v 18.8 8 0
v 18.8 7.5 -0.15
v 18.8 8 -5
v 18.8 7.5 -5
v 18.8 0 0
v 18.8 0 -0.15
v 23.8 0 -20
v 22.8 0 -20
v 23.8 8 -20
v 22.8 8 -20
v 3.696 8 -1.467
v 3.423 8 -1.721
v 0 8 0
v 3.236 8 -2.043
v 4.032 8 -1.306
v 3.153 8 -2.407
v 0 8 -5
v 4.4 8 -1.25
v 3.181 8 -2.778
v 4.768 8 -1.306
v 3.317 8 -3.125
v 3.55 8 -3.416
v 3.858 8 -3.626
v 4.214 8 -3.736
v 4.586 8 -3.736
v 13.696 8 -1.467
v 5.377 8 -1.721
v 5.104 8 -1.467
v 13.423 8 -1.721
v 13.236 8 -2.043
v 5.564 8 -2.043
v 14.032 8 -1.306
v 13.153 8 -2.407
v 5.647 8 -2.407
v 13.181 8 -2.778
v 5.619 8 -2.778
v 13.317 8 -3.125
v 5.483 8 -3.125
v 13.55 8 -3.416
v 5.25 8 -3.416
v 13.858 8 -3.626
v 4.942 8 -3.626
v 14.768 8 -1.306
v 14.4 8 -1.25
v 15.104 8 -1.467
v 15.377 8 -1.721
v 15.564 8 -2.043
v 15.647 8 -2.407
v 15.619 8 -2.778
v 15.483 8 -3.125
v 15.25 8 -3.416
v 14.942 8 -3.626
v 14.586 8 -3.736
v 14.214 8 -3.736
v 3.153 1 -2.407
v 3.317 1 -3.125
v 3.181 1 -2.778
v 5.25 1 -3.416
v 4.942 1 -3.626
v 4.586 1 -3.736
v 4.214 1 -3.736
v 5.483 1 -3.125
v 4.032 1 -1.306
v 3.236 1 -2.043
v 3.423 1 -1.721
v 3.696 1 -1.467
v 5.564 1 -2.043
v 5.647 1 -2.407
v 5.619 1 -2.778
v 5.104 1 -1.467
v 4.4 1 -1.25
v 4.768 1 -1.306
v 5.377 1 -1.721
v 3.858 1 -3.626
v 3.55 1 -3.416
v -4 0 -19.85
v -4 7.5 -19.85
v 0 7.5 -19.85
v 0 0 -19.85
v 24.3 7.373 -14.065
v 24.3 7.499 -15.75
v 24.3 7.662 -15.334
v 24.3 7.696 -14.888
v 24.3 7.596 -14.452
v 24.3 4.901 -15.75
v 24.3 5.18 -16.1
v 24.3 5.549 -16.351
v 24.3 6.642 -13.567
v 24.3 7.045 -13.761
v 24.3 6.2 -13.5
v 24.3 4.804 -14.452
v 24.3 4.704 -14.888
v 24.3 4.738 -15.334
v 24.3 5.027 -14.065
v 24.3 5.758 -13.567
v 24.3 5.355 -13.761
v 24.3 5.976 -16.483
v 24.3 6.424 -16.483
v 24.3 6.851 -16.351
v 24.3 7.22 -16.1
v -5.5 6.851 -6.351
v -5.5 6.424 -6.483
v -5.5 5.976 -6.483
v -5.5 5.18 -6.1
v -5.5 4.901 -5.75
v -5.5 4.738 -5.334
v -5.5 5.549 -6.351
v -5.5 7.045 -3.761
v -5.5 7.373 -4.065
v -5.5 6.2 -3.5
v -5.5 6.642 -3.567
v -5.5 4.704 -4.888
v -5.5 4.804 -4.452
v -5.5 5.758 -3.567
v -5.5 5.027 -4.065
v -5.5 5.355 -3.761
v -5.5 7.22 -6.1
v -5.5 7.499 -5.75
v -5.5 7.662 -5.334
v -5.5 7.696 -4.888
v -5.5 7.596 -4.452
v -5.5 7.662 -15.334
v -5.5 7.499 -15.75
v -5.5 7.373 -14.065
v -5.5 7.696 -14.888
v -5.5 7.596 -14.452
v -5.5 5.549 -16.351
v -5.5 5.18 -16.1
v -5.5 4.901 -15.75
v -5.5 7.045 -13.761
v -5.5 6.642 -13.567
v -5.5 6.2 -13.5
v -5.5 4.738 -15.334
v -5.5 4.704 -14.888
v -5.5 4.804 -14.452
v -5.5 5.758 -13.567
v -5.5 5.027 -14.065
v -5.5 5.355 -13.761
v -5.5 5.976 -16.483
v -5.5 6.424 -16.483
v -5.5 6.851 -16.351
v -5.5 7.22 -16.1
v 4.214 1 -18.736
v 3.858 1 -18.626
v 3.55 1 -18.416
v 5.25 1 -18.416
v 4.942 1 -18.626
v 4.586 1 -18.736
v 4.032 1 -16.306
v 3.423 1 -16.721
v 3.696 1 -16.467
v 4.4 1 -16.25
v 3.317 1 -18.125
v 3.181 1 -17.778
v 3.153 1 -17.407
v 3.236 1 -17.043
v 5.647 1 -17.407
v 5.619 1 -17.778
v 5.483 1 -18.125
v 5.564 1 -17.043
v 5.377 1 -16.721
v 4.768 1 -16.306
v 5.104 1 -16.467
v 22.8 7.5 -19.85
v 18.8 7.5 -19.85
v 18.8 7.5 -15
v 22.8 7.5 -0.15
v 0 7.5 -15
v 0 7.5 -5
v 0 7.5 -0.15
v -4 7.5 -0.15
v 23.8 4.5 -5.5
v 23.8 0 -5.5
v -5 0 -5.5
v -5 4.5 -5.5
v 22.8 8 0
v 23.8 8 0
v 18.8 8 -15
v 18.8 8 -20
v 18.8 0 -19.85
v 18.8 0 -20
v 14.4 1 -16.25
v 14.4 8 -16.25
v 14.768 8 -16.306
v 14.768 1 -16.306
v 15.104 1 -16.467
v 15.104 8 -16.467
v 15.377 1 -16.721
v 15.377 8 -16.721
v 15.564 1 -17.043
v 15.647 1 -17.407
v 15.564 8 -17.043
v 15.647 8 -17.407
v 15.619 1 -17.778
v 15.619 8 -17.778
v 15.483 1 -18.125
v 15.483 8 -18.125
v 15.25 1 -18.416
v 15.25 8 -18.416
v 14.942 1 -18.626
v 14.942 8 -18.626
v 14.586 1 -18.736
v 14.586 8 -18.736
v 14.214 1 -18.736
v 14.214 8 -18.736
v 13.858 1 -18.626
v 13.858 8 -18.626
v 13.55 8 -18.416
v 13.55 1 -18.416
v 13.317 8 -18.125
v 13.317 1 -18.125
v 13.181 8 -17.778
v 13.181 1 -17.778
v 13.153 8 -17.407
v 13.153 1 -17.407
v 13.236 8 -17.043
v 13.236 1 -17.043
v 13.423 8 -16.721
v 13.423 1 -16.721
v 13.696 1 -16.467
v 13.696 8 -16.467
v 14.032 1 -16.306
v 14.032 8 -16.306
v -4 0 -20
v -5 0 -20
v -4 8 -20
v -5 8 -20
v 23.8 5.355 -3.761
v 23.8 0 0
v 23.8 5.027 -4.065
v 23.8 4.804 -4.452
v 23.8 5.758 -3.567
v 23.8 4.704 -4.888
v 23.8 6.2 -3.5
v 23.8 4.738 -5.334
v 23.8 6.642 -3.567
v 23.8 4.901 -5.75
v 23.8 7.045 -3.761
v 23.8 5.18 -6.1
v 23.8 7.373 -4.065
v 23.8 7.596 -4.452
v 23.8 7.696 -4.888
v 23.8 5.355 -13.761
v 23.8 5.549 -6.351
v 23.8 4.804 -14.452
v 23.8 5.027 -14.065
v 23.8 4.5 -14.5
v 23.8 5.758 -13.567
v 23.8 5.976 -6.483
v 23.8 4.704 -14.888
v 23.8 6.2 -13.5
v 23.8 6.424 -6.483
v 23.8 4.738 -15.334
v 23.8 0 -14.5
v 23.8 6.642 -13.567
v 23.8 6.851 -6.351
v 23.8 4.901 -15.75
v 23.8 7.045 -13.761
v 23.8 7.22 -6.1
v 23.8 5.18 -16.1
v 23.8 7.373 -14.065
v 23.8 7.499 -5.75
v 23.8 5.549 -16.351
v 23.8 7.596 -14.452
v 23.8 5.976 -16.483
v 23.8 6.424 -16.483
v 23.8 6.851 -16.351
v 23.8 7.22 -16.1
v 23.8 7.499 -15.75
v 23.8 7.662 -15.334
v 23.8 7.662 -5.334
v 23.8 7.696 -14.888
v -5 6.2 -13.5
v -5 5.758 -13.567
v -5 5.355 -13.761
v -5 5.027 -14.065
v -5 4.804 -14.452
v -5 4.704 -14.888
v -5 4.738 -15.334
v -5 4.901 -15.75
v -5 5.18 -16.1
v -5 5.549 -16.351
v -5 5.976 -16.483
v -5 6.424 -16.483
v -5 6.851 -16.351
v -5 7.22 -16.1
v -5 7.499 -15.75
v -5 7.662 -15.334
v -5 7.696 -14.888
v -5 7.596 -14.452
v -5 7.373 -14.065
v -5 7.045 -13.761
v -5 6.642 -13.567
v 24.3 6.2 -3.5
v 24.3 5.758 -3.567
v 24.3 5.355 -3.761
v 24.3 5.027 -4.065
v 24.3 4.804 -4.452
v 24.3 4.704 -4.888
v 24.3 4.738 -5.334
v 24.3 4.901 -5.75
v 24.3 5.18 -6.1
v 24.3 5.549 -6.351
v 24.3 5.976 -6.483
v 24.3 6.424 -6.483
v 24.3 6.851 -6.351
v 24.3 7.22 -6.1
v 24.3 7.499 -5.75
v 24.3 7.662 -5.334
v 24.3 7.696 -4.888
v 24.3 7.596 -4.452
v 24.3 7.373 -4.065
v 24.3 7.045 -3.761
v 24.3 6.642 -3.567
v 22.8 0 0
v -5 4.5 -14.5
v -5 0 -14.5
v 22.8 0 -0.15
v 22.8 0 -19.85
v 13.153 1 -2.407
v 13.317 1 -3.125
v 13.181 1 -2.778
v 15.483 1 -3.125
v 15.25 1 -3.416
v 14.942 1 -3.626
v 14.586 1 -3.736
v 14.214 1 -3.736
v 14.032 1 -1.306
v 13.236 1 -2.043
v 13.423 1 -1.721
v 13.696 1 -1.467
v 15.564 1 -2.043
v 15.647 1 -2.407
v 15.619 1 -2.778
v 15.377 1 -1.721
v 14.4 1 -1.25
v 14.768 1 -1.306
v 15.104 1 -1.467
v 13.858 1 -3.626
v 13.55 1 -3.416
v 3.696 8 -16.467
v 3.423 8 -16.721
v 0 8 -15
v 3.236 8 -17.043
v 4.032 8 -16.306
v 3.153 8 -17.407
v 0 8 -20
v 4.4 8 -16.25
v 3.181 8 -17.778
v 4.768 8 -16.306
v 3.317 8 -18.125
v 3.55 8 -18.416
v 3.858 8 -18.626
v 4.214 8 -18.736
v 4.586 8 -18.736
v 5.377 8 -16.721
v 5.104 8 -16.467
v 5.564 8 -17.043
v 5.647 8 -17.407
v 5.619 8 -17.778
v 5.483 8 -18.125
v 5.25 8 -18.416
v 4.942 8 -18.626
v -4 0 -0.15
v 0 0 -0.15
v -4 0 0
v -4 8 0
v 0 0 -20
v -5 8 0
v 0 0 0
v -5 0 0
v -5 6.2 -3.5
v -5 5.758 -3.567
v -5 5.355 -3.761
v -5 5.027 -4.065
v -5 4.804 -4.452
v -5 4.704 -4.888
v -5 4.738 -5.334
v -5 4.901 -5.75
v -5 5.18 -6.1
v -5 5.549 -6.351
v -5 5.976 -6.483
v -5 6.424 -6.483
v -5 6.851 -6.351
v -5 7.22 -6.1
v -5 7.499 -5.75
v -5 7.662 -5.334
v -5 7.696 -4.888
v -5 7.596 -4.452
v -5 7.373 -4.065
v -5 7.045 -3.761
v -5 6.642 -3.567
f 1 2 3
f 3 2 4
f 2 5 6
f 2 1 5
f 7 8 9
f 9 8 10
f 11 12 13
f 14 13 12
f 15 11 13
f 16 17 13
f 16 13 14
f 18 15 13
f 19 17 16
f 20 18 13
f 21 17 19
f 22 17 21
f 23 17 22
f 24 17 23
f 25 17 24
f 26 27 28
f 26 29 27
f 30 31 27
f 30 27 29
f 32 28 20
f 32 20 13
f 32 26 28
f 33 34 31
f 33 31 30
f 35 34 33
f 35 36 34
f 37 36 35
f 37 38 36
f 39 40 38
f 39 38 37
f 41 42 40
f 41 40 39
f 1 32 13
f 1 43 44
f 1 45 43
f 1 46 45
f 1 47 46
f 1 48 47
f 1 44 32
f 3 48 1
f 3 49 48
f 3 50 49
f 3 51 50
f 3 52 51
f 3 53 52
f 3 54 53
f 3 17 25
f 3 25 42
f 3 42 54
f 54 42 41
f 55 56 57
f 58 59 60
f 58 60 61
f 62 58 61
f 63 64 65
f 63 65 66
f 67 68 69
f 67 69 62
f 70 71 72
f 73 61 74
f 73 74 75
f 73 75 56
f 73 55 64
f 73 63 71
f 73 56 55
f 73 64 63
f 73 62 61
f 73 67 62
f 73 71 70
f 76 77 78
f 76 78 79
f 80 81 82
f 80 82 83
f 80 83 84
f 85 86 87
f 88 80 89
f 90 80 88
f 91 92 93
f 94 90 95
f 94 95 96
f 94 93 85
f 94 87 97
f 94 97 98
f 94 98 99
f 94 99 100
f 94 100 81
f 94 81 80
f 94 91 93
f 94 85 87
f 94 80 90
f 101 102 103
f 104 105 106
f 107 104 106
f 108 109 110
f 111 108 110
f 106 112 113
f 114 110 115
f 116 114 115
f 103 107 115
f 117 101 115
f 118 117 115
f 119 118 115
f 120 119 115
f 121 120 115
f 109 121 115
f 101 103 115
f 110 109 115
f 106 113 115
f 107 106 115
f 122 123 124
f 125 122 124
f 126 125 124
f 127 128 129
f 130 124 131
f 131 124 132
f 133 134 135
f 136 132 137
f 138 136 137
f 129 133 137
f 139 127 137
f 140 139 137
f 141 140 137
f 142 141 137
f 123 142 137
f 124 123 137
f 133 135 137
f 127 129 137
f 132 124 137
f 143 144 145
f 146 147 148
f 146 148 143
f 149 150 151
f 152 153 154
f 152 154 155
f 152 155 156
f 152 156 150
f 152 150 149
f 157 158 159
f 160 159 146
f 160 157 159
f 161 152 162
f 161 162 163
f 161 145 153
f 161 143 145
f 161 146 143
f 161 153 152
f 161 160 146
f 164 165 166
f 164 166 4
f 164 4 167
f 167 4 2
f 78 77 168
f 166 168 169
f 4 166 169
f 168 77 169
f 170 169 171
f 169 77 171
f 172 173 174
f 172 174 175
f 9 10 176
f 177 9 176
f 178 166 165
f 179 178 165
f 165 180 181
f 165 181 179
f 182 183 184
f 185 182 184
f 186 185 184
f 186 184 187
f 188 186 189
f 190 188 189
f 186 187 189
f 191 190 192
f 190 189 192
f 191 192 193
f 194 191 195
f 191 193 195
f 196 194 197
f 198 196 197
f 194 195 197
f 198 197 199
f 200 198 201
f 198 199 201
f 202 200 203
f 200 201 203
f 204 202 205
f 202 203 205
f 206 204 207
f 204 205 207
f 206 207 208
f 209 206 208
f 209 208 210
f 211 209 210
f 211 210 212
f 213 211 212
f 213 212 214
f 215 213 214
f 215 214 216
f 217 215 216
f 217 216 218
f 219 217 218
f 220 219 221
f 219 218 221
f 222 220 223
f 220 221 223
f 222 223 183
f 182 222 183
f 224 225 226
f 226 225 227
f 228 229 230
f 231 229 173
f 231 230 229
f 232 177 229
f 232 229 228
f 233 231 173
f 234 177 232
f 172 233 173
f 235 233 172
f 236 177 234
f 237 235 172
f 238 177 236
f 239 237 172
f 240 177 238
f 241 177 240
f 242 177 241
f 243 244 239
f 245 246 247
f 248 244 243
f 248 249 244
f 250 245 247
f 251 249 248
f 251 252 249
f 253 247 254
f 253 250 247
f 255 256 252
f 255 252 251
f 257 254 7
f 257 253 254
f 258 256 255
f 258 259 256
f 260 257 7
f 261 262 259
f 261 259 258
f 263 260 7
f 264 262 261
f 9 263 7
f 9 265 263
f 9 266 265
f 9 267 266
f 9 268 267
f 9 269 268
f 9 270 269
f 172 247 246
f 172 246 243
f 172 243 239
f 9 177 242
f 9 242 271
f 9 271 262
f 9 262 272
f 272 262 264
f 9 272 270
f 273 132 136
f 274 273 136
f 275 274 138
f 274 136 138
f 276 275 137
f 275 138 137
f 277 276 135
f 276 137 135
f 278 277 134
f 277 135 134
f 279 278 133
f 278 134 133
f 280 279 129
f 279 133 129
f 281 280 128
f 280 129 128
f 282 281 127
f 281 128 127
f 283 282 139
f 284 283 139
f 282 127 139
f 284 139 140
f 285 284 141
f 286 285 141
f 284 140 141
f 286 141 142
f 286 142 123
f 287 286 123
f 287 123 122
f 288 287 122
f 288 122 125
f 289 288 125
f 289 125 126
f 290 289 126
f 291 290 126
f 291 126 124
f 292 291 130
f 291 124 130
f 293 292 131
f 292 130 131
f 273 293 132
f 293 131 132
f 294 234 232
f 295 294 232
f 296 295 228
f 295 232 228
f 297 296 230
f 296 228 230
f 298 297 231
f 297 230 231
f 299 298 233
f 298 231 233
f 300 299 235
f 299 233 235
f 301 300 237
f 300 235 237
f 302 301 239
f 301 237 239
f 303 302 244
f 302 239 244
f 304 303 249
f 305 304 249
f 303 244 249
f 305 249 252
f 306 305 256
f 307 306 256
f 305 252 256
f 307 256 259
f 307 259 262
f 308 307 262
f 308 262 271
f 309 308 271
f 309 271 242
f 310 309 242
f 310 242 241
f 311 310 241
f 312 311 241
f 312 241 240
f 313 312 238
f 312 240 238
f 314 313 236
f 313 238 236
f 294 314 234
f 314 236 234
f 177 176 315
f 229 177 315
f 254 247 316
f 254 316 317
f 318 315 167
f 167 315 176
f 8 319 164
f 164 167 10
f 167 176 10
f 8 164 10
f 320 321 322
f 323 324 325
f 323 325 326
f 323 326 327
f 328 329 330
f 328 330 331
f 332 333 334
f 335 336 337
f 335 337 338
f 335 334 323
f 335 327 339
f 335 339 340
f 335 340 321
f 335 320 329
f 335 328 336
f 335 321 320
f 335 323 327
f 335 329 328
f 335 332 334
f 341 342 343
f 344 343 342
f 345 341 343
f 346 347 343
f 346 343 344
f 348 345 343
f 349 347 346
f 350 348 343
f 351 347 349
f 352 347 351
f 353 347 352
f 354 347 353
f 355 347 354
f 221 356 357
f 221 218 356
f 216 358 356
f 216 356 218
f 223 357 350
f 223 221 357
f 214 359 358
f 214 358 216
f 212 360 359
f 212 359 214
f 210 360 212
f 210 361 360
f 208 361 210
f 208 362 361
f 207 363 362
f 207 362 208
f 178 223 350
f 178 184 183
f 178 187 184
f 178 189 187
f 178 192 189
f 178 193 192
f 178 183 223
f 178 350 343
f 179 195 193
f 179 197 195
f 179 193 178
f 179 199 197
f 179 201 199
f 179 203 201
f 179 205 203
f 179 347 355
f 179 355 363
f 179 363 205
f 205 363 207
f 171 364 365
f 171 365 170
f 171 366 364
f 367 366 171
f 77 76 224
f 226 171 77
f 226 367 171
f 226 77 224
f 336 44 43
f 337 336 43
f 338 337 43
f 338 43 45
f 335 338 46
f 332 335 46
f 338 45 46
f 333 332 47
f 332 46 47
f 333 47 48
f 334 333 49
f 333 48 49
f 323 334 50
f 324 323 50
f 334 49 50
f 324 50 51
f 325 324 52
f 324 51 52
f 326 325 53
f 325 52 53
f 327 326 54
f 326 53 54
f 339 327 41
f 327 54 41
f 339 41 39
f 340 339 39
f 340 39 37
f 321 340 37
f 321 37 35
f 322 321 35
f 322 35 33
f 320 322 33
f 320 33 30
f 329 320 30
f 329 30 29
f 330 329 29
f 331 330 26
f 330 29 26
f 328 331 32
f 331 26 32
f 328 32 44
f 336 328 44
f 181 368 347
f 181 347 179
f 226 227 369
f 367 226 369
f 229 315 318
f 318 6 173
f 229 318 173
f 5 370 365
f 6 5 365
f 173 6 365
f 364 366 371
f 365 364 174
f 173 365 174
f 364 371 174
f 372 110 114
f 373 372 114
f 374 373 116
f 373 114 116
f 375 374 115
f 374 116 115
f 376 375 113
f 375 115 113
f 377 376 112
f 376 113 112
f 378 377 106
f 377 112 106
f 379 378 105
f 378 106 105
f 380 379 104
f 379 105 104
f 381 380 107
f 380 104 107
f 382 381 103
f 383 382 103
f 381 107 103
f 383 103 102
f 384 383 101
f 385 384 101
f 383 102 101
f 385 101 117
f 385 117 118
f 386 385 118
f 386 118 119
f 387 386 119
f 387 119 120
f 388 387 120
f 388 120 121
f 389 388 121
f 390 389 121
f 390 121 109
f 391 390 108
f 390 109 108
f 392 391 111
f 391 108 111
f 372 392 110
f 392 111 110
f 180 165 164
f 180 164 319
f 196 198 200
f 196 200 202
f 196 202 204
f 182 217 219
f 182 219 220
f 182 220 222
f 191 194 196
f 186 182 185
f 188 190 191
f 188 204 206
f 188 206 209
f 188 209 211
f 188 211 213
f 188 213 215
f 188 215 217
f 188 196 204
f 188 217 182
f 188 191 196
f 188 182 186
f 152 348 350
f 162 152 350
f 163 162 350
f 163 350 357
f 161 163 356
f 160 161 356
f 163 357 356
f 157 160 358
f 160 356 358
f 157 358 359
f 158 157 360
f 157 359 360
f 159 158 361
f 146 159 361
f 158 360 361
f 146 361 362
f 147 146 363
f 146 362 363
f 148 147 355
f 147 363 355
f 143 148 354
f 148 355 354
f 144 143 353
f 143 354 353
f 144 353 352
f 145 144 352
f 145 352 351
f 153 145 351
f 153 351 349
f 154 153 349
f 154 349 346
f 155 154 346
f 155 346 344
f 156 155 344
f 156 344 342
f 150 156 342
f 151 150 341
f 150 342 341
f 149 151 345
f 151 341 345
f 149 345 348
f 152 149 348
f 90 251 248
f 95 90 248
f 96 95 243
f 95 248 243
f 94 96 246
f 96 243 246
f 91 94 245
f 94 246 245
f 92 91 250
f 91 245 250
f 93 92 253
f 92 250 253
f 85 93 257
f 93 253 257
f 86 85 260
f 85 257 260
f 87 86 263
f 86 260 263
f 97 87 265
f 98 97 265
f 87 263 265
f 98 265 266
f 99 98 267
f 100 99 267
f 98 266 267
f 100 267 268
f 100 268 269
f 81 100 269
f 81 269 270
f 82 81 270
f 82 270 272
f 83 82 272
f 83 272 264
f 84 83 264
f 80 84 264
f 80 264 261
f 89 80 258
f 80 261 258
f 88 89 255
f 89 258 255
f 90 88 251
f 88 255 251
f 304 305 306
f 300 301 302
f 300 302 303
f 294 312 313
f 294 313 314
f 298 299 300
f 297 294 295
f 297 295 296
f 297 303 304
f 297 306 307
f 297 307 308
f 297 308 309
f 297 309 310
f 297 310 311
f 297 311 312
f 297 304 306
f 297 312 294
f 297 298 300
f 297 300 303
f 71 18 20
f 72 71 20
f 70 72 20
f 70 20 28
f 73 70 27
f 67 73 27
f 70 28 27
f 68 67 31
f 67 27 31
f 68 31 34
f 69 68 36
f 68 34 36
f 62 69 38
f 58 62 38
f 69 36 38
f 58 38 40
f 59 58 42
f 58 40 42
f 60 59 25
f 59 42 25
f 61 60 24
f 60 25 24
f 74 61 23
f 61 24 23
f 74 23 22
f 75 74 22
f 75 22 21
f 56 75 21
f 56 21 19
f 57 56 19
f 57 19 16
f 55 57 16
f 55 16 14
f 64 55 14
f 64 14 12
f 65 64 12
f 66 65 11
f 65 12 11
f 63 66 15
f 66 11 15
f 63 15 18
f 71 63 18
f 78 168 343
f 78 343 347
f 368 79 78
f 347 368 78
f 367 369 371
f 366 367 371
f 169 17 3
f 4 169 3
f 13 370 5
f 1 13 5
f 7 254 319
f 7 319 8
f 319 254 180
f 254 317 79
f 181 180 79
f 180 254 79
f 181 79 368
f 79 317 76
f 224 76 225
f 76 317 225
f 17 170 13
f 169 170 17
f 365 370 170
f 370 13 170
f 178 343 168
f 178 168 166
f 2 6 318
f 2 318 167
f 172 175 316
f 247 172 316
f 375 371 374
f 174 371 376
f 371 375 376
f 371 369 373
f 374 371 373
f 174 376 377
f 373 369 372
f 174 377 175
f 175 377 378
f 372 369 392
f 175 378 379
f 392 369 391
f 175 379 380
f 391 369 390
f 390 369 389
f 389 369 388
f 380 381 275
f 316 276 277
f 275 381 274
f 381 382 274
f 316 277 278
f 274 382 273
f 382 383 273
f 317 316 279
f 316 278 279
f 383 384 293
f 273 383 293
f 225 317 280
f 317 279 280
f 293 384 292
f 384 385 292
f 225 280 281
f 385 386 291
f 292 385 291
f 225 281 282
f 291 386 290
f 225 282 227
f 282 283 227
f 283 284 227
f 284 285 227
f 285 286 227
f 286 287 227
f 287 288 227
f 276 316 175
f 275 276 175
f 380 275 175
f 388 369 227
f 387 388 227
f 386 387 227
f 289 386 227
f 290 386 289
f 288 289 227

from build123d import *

# Parameters (mm, degrees)
SKETCH1_W           = 18.8
SKETCH1_H           = 20
BOSS_EXTRUDE1_DEPTH = 8
SKETCH2_R           = 1.25
CUT_EXTRUDE1_DEPTH  = 7
SKETCH3_W           = 18.8
SKETCH3_H           = 10
CUT_EXTRUDE2_DEPTH  = 0.5
SKETCH4_W           = 9
SKETCH4_H           = 4.5
CUT_EXTRUDE3_DEPTH  = 20
BOSS_EXTRUDE2_DEPTH = 4
LPATTERN1_COUNT     = 2
LPATTERN1_PITCH     = 22.8
BOSS_EXTRUDE3_DEPTH = 1
LPATTERN3_COUNT     = 2
LPATTERN3_PITCH     = 27.8
SKETCH8_R           = 1.5
BOSS_EXTRUDE4_DEPTH = 0.5
LPATTERN4_COUNT     = 2
LPATTERN4_PITCH     = 29.3


with BuildPart() as part:
    # Sketch1 → Boss-Extrude1 (new body)
    with BuildSketch(Plane(origin=(0, 0, 0), x_dir=(1, 0, 0), z_dir=(0, 1, 0))):
        with Locations((9.4, 10)):
            Rectangle(SKETCH1_W, SKETCH1_H)
    extrude(amount=BOSS_EXTRUDE1_DEPTH)

    # Sketch2 → Cut-Extrude1 (cut)
    with BuildSketch(Plane(origin=(0, 8, 0), x_dir=(1, 0, 0), z_dir=(0, 1, 0))):
        with Locations(Location((4.4, 2.5, 0), (0, 0, 270))):
            Circle(SKETCH2_R)
        with Locations(Location((14.4, 2.5, 0), (0, 0, 270))):
            Circle(SKETCH2_R)
        with Locations(Location((14.4, 17.5, 0), (0, 0, 270))):
            Circle(SKETCH2_R)
        with Locations(Location((4.4, 17.5, 0), (0, 0, 270))):
            Circle(SKETCH2_R)
    extrude(amount=-CUT_EXTRUDE1_DEPTH, mode=Mode.SUBTRACT)

    # Sketch3 → Cut-Extrude2 (cut)
    with BuildSketch(Plane(origin=(0, 8, 0), x_dir=(1, 0, 0), z_dir=(0, 1, 0))):
        with Locations((9.4, 10)):
            Rectangle(SKETCH3_W, SKETCH3_H)
    extrude(amount=-CUT_EXTRUDE2_DEPTH, mode=Mode.SUBTRACT)

    # Sketch4 → Cut-Extrude3 (cut)
    with BuildSketch(Plane(origin=(18.8, 0, 0), x_dir=(0, 0, -1), z_dir=(1, 0, 0))):
        with Locations((10, 2.25)):
            Rectangle(SKETCH4_W, SKETCH4_H)
    extrude(amount=-CUT_EXTRUDE3_DEPTH, mode=Mode.SUBTRACT)

    # Sketch5 → Boss-Extrude2 (add)
    with BuildSketch(Plane(origin=(18.8, 0, 0), x_dir=(0, 0, -1), z_dir=(1, 0, 0))):
        Polygon((5.5, 0), (0.15, 0), (0.15, 7.5), (5.5, 7.5), (14.5, 7.5), (19.85, 7.5), (19.85, 0), (14.5, 0), (14.5, 4.5), (5.5, 4.5), align=None)
    boss_extrude2 = extrude(amount=BOSS_EXTRUDE2_DEPTH)

    # LPattern1: Boss-Extrude2 ×2
    with Locations(*[(-i * LPATTERN1_PITCH, 0, 0) for i in range(1, LPATTERN1_COUNT)]):
        add(boss_extrude2)

    # Sketch6 → Boss-Extrude3 (add)
    with BuildSketch(Plane(origin=(22.8, 0, 0), x_dir=(0, 0, -1), z_dir=(1, 0, 0))):
        Polygon((0, 0), (5, 0), (5.5, 0), (5.5, 4.5), (14.5, 4.5), (14.5, 0), (15, 0), (20, 0), (20, 8), (15, 8), (5, 8), (0, 8), align=None)
    boss_extrude3 = extrude(amount=BOSS_EXTRUDE3_DEPTH)

    # LPattern3: Boss-Extrude3 ×2
    with Locations(*[(-i * LPATTERN3_PITCH, 0, 0) for i in range(1, LPATTERN3_COUNT)]):
        add(boss_extrude3)

    # Sketch8 → Boss-Extrude4 (add)
    with BuildSketch(Plane(origin=(23.8, 0, 0), x_dir=(0, 0, -1), z_dir=(1, 0, 0))):
        with Locations(Location((5, 6.2, 0), (0, 0, 180))):
            Circle(SKETCH8_R)
        with Locations(Location((15, 6.2, 0), (0, 0, 180))):
            Circle(SKETCH8_R)
    boss_extrude4 = extrude(amount=BOSS_EXTRUDE4_DEPTH)

    # LPattern4: Boss-Extrude4 ×2
    with Locations(*[(-i * LPATTERN4_PITCH, 0, 0) for i in range(1, LPATTERN4_COUNT)]):
        add(boss_extrude4)


solid = part.part
